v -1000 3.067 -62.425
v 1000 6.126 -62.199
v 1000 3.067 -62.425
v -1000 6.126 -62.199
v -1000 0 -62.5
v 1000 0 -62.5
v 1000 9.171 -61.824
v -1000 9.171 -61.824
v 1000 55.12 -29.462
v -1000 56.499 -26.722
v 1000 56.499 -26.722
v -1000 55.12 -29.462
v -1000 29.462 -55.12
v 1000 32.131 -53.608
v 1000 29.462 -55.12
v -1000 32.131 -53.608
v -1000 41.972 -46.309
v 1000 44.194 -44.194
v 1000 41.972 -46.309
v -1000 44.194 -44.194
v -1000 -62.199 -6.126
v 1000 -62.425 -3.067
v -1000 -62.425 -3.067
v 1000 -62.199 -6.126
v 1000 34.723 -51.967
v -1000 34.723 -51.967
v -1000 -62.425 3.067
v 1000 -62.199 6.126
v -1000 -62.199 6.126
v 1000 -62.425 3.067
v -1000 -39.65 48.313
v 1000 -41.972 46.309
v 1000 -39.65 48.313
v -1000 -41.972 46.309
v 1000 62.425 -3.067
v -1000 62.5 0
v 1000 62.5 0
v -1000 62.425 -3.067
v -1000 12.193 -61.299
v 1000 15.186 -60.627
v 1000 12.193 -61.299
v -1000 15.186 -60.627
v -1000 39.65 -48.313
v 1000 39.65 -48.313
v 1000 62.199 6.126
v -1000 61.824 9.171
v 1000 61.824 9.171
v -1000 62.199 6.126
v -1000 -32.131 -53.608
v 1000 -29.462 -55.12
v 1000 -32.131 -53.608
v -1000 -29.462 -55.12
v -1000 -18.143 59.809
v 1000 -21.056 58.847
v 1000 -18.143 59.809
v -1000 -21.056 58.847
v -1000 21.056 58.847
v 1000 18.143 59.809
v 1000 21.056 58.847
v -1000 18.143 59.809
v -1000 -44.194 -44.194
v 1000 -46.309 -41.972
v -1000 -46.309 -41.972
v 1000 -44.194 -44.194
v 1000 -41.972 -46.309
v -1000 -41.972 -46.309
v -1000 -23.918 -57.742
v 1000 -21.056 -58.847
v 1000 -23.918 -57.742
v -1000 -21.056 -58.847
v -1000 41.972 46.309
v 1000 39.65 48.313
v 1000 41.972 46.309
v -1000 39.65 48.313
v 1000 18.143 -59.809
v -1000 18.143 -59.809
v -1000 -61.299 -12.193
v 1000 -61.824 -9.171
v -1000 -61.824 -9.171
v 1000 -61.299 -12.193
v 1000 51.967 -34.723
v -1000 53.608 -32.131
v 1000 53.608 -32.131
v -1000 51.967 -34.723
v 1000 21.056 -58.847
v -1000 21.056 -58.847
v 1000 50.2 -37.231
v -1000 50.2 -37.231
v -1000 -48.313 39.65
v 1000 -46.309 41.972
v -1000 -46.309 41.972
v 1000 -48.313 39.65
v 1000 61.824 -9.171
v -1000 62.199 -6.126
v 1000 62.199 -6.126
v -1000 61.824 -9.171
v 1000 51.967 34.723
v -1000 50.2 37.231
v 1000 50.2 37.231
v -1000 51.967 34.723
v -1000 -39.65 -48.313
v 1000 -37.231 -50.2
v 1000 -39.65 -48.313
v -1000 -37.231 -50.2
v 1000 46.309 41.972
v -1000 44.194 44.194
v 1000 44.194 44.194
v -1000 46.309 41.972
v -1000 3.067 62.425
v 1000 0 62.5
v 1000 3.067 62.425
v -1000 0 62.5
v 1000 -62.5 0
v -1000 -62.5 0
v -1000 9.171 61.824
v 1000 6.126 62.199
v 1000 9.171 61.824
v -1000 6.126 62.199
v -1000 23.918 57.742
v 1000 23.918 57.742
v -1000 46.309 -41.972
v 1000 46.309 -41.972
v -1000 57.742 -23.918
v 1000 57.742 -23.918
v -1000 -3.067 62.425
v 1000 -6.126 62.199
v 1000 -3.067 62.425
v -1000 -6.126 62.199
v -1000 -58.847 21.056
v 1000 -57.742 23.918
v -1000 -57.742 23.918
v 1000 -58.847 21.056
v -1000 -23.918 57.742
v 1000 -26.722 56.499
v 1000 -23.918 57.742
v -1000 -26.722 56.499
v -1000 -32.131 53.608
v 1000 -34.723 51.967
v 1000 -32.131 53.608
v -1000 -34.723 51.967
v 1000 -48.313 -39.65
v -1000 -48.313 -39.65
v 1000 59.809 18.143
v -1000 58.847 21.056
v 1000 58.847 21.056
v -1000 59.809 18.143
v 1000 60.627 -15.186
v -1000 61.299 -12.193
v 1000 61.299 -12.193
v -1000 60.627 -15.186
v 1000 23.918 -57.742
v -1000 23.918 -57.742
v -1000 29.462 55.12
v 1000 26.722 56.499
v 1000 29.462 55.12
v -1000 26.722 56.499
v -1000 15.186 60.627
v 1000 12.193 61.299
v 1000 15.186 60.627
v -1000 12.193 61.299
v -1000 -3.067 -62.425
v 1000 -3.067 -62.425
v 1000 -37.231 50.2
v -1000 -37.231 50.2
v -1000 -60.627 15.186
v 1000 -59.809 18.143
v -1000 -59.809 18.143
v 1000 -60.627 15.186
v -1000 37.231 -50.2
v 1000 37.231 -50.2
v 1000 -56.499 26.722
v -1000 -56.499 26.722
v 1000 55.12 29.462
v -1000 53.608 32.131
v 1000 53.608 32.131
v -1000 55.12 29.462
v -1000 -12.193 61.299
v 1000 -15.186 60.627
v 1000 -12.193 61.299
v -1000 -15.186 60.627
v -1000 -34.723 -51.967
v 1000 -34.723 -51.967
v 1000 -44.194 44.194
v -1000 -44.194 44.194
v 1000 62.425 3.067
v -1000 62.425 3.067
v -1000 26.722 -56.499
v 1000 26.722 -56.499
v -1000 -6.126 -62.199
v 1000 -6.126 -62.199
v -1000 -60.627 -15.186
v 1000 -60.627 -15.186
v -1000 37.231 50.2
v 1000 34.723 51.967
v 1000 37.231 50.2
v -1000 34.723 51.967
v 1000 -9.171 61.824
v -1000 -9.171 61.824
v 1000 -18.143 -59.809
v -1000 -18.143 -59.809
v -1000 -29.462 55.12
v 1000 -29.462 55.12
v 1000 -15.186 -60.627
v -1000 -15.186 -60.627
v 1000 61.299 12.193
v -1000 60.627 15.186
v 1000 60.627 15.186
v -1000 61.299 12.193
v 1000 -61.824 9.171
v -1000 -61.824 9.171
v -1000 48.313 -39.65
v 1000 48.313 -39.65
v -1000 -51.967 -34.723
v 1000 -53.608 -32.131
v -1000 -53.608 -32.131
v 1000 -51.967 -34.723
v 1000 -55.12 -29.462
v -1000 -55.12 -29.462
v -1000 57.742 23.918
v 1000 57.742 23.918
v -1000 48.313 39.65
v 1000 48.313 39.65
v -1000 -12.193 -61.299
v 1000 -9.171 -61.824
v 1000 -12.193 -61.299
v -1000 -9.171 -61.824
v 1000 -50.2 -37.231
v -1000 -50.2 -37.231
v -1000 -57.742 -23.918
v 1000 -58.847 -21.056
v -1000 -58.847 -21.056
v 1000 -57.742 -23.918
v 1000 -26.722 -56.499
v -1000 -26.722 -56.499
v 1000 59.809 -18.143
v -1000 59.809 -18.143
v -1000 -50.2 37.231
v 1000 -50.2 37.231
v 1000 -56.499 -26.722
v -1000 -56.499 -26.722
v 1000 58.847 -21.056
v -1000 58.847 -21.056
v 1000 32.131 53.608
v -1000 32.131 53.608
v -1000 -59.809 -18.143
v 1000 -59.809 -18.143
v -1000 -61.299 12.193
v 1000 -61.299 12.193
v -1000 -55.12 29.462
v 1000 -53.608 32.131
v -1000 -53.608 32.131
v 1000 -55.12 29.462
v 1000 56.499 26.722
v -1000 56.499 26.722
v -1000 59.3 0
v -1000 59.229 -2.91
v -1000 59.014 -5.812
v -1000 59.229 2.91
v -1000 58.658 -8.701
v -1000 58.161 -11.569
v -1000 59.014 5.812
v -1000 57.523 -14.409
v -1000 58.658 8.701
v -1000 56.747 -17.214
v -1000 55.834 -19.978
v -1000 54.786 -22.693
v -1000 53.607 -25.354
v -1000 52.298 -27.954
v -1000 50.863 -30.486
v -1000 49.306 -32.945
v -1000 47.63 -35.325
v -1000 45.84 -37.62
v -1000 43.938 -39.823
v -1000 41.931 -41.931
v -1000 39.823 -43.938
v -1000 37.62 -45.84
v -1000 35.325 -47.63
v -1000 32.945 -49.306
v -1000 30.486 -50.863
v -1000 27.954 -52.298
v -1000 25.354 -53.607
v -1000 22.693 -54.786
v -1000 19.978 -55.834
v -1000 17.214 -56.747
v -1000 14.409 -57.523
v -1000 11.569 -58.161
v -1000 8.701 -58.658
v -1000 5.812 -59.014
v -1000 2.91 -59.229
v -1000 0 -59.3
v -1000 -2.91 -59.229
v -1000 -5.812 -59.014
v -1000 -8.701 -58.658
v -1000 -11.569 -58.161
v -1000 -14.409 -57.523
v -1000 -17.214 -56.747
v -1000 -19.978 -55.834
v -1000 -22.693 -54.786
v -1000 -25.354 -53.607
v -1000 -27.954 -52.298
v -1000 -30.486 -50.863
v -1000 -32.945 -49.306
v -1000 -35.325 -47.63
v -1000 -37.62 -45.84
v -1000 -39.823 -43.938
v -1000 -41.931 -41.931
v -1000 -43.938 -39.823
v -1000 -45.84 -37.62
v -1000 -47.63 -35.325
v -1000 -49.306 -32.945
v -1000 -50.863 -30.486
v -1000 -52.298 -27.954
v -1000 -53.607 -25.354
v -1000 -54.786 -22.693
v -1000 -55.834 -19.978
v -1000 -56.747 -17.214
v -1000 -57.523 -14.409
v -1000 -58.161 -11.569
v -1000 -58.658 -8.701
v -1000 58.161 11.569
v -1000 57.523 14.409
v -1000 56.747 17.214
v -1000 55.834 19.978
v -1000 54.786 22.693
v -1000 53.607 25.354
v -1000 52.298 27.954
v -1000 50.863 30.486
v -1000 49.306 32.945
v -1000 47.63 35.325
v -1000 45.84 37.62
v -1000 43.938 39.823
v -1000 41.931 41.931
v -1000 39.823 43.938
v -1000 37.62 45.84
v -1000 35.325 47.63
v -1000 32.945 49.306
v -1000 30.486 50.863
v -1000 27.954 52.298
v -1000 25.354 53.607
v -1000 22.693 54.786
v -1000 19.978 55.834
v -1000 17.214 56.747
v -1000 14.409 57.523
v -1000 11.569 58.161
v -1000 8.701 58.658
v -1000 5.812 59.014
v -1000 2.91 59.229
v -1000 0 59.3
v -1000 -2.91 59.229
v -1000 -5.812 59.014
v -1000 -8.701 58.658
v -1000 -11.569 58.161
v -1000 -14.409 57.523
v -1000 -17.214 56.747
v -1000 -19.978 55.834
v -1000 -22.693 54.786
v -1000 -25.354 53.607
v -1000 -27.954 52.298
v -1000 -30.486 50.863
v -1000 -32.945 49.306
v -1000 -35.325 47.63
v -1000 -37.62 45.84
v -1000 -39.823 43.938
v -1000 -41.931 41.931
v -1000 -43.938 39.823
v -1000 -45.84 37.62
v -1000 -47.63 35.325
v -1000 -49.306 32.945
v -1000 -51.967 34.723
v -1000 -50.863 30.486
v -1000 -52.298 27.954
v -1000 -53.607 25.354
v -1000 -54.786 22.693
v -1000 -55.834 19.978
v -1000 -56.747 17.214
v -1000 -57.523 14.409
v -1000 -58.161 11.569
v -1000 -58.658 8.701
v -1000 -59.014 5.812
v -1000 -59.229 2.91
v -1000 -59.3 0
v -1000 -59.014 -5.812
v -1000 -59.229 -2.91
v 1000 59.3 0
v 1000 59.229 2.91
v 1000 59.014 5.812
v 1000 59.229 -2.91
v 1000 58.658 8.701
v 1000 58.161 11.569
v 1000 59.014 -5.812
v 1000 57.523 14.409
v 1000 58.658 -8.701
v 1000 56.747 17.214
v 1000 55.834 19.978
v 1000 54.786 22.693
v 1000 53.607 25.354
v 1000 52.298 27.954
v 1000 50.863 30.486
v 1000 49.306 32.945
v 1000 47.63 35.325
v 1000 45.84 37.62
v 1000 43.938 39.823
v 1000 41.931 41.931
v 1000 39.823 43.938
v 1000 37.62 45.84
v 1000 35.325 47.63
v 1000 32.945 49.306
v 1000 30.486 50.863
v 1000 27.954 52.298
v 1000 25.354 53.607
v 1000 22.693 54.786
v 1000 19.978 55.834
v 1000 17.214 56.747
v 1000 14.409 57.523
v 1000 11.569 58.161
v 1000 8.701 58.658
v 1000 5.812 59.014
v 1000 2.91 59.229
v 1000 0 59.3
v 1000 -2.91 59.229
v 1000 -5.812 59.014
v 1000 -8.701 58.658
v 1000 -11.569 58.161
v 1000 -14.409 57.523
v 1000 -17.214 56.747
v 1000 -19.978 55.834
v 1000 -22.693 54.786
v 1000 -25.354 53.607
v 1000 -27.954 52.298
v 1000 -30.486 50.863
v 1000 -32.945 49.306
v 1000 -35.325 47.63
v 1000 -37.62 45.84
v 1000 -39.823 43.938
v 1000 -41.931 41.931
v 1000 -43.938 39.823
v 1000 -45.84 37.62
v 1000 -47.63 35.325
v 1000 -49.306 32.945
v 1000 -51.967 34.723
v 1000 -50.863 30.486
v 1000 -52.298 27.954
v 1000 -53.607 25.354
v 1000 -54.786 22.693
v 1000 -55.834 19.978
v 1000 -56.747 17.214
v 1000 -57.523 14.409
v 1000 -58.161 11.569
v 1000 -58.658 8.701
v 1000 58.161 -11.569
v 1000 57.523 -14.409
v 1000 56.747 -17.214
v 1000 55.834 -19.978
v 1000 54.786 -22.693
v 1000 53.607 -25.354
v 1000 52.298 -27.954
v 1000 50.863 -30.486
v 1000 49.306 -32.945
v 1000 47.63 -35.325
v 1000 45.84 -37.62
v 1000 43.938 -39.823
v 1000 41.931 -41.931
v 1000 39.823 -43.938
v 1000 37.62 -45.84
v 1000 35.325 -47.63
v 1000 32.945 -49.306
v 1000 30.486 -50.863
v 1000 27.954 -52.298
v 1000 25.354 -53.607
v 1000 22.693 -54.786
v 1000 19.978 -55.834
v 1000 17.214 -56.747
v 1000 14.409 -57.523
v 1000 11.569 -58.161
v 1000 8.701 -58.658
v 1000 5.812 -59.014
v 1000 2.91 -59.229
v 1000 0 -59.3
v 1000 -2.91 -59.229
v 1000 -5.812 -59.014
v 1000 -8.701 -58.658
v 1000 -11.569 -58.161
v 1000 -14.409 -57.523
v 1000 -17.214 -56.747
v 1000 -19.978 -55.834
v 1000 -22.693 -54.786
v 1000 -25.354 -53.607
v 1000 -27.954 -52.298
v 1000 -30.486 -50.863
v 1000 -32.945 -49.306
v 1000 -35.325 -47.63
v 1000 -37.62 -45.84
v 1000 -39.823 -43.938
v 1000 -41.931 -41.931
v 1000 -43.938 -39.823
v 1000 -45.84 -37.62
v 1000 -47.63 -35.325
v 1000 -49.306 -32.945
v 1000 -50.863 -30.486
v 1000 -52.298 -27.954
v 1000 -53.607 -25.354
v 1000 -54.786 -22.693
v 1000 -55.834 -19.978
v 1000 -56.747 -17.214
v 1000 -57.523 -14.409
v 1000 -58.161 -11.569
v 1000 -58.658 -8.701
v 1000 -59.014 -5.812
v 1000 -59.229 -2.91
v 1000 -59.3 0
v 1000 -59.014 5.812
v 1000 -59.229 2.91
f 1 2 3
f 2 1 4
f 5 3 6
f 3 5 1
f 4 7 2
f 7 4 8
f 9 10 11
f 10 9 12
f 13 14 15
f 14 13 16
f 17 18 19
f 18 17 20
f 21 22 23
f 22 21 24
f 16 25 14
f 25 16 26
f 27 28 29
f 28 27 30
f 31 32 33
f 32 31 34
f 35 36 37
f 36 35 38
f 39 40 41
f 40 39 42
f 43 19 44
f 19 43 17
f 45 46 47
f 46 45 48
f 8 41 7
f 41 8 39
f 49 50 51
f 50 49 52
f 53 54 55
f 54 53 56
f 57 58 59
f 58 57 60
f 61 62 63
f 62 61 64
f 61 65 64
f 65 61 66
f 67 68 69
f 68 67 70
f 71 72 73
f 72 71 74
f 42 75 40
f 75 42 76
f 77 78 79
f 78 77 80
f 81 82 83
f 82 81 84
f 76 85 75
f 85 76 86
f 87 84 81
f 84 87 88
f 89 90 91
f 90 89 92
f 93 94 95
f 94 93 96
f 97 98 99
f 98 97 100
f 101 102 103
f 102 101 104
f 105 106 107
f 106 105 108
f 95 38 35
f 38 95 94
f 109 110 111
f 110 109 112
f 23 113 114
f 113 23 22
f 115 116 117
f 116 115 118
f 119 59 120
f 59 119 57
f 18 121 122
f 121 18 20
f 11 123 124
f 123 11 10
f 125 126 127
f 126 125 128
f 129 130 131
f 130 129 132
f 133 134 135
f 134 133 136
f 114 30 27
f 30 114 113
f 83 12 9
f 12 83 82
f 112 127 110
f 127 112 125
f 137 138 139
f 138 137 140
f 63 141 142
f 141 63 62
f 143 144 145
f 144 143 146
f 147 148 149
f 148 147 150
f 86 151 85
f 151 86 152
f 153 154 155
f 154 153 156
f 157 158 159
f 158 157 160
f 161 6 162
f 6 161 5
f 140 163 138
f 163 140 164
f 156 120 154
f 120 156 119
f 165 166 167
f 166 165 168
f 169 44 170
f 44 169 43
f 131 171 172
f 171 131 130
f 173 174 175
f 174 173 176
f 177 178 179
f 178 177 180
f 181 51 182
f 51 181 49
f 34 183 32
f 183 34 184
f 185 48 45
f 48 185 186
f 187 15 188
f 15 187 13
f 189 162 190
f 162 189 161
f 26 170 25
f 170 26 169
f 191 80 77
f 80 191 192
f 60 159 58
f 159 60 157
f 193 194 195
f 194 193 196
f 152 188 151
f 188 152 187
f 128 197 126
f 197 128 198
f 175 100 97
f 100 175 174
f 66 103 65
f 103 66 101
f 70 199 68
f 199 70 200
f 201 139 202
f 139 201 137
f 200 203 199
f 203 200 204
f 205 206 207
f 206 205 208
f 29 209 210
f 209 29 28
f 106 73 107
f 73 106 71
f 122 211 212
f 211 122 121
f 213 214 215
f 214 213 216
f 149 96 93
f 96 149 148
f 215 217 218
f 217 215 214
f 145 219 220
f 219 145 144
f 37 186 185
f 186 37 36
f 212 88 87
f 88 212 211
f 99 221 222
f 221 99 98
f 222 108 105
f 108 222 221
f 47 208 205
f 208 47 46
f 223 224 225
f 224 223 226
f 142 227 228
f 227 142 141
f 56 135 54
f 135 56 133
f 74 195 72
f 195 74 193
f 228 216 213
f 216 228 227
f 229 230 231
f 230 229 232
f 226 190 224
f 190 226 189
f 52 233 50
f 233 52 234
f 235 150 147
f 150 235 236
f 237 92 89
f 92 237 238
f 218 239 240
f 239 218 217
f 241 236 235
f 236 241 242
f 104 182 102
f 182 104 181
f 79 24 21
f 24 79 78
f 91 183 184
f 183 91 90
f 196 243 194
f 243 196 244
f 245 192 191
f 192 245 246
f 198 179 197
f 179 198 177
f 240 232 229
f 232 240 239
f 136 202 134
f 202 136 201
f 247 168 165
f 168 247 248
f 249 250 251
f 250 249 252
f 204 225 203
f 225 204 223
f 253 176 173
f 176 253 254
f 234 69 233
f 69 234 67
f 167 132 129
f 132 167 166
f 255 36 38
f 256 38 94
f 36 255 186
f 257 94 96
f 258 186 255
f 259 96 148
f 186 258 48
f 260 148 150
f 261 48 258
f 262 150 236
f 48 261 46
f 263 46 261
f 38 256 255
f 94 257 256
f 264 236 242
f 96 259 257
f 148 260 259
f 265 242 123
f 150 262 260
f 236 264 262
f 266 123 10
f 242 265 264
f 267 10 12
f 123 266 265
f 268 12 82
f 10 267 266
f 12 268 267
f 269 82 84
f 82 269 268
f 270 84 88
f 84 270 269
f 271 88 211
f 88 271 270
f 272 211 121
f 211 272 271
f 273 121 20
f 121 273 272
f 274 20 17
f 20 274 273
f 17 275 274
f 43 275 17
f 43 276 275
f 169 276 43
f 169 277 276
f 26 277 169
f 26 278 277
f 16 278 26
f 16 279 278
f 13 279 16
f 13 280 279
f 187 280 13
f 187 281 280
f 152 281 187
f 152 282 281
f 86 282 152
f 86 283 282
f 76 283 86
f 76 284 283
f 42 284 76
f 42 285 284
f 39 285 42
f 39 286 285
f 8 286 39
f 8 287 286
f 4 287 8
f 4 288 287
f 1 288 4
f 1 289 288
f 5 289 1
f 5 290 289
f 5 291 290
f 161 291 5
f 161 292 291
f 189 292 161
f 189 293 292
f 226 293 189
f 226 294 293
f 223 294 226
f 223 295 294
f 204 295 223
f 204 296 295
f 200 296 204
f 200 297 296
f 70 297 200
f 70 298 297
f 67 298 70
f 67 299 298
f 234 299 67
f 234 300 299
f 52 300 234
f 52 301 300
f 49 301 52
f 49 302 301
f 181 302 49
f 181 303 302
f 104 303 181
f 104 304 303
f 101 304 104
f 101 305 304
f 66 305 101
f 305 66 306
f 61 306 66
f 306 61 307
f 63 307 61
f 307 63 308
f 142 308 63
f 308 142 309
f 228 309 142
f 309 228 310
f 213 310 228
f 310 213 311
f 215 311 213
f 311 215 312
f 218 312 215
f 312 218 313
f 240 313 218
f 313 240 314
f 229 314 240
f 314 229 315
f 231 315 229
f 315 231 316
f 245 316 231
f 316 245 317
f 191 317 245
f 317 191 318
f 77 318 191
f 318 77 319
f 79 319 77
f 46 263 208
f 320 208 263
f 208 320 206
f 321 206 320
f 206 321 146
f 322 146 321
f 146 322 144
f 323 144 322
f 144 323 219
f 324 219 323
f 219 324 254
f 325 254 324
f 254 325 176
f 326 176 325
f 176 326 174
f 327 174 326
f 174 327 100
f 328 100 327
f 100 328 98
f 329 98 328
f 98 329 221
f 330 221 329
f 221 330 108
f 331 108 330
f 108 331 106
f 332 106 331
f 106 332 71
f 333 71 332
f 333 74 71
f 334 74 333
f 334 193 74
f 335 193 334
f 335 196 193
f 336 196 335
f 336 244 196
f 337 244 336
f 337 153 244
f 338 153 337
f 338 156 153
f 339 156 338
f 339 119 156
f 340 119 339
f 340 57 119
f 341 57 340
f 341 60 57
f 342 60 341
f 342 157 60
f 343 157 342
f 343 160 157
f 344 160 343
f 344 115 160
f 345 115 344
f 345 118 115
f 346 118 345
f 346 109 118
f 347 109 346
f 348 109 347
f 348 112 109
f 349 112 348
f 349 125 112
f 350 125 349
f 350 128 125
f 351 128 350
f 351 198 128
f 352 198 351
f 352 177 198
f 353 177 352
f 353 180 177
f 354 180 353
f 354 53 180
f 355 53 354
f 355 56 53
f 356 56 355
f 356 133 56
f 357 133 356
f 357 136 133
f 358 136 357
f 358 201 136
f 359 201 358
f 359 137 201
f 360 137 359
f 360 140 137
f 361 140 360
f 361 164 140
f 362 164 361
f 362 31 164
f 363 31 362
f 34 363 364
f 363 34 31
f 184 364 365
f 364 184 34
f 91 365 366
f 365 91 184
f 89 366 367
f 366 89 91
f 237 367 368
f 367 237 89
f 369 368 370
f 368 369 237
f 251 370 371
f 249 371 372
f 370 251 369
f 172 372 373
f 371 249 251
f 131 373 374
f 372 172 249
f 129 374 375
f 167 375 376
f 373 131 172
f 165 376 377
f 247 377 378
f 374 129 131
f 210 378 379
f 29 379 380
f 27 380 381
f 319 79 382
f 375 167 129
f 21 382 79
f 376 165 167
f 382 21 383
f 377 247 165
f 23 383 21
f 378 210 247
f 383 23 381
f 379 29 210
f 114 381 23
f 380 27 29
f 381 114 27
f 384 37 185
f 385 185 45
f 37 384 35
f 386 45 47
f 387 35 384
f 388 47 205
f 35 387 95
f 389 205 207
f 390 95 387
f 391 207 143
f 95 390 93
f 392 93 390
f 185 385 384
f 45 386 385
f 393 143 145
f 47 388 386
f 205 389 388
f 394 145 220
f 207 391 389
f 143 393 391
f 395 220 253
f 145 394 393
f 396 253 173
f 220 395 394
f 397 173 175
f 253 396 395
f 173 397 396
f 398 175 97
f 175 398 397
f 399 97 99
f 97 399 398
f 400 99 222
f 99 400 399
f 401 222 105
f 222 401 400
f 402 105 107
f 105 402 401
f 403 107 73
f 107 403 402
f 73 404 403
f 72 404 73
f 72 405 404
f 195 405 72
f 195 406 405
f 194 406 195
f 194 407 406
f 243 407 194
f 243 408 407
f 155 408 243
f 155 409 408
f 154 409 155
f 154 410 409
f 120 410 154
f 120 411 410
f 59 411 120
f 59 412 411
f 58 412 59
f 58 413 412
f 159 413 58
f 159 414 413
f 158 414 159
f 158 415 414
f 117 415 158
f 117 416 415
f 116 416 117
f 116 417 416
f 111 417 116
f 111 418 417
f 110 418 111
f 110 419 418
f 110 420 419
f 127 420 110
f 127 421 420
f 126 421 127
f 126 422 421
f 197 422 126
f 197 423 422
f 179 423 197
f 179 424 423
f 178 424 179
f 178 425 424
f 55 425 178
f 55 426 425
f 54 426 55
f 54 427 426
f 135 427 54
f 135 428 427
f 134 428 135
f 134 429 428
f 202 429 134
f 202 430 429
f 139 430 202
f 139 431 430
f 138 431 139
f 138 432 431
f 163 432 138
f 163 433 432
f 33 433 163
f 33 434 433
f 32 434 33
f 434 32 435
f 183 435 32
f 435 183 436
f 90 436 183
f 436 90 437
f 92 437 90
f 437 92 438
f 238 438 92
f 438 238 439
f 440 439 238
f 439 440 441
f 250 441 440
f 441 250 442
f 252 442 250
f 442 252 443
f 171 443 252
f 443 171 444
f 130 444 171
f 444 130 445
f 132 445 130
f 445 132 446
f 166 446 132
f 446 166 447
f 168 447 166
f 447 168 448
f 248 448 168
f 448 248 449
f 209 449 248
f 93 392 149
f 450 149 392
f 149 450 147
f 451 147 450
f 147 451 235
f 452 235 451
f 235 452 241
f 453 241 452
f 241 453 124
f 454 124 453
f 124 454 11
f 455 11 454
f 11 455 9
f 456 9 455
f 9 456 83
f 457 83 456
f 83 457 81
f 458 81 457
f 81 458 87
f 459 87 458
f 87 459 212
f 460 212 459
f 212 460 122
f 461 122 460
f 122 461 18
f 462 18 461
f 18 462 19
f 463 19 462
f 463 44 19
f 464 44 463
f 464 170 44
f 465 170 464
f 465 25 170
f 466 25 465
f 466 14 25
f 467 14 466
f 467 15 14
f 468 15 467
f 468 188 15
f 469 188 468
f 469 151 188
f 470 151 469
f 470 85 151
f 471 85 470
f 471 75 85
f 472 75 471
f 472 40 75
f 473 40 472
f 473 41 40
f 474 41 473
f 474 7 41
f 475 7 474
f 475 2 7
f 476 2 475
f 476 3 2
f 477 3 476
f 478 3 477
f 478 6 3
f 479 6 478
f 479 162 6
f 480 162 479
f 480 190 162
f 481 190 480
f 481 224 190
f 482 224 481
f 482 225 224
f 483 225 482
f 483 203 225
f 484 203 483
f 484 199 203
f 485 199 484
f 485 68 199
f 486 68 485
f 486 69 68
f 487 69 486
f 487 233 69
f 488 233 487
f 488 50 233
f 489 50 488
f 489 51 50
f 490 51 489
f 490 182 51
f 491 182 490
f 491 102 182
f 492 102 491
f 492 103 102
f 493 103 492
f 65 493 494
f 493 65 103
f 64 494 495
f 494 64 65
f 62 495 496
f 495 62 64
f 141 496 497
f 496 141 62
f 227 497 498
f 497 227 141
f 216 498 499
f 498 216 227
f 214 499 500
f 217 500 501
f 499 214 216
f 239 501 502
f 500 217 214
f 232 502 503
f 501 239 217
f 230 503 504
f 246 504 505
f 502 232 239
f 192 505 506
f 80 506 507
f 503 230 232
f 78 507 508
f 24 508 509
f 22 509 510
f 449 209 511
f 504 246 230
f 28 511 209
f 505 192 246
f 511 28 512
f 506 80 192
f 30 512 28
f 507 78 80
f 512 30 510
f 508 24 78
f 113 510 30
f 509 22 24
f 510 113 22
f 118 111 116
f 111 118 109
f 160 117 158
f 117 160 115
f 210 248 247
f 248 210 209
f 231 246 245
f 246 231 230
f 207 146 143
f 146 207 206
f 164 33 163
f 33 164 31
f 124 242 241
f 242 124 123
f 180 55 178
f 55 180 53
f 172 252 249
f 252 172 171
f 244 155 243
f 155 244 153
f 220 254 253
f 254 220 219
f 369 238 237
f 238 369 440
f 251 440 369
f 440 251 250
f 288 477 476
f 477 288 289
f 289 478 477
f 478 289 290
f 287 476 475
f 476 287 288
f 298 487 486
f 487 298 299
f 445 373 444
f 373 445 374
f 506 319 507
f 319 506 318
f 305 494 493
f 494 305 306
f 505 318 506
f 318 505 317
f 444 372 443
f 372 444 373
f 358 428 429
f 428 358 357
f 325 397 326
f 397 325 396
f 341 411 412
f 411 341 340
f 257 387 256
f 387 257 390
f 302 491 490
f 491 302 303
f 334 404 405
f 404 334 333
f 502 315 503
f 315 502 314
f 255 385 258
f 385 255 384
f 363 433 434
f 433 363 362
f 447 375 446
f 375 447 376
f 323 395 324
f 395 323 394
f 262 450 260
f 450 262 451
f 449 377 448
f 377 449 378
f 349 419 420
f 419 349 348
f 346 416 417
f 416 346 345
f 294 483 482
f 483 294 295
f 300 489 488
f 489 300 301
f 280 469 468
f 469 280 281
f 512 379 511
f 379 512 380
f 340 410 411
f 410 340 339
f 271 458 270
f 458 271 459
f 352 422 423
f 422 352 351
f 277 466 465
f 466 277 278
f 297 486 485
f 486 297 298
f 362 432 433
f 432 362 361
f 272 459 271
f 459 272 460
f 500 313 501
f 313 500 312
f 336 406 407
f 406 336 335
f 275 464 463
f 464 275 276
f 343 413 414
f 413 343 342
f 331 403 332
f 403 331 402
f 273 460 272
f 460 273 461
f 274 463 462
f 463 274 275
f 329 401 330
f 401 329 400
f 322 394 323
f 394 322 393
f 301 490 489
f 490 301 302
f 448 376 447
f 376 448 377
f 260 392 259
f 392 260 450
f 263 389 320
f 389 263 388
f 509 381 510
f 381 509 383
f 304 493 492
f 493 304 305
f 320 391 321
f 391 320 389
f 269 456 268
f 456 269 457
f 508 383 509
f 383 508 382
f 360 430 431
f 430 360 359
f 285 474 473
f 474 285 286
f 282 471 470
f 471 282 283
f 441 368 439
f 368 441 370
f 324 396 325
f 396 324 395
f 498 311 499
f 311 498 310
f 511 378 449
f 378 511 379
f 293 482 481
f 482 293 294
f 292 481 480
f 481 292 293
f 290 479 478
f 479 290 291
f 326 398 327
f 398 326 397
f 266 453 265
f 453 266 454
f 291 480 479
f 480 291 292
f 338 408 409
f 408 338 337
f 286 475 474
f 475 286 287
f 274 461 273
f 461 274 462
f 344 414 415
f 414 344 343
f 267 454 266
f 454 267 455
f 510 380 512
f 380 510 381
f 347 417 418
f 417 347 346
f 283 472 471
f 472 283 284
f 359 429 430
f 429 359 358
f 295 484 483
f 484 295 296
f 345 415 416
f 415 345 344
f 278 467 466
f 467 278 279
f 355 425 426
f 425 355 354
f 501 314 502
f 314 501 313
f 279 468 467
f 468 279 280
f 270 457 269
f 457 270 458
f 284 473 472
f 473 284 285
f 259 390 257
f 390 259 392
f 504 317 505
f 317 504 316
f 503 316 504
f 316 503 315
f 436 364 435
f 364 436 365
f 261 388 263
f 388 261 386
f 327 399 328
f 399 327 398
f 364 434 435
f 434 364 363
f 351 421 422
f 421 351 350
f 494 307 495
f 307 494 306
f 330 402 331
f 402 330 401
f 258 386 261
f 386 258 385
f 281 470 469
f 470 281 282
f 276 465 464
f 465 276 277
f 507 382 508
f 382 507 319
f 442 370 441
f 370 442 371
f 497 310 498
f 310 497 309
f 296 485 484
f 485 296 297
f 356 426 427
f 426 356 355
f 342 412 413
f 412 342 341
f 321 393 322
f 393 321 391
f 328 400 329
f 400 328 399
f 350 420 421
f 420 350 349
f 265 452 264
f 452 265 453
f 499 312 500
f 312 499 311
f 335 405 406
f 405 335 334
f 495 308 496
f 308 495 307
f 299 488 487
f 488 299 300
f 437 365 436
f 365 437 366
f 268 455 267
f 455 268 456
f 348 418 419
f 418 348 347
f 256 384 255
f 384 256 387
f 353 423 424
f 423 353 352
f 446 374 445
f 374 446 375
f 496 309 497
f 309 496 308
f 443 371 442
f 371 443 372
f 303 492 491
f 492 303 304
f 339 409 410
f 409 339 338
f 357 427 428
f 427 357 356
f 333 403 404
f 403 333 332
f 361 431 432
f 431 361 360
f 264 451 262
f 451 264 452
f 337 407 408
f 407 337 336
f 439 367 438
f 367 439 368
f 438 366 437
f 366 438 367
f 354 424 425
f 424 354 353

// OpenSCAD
$fn = 128;

// HT 125 pipe parameters (mm)
outer_diameter = 125;
wall_thickness = 3.2;
length = 2000;

inner_diameter = outer_diameter - 2*wall_thickness;

module ht_pipe(od, id, L) {
    eps = 0.5; // small overlap to ensure clean boolean

    // Orient along X so all orthographic views show the full length consistently
    rotate([0, 90, 0])
    difference() {
        cylinder(h = L, d = od, center = true);
        cylinder(h = L + 2*eps, d = id, center = true);
    }
}

ht_pipe(outer_diameter, inner_diameter, length);
